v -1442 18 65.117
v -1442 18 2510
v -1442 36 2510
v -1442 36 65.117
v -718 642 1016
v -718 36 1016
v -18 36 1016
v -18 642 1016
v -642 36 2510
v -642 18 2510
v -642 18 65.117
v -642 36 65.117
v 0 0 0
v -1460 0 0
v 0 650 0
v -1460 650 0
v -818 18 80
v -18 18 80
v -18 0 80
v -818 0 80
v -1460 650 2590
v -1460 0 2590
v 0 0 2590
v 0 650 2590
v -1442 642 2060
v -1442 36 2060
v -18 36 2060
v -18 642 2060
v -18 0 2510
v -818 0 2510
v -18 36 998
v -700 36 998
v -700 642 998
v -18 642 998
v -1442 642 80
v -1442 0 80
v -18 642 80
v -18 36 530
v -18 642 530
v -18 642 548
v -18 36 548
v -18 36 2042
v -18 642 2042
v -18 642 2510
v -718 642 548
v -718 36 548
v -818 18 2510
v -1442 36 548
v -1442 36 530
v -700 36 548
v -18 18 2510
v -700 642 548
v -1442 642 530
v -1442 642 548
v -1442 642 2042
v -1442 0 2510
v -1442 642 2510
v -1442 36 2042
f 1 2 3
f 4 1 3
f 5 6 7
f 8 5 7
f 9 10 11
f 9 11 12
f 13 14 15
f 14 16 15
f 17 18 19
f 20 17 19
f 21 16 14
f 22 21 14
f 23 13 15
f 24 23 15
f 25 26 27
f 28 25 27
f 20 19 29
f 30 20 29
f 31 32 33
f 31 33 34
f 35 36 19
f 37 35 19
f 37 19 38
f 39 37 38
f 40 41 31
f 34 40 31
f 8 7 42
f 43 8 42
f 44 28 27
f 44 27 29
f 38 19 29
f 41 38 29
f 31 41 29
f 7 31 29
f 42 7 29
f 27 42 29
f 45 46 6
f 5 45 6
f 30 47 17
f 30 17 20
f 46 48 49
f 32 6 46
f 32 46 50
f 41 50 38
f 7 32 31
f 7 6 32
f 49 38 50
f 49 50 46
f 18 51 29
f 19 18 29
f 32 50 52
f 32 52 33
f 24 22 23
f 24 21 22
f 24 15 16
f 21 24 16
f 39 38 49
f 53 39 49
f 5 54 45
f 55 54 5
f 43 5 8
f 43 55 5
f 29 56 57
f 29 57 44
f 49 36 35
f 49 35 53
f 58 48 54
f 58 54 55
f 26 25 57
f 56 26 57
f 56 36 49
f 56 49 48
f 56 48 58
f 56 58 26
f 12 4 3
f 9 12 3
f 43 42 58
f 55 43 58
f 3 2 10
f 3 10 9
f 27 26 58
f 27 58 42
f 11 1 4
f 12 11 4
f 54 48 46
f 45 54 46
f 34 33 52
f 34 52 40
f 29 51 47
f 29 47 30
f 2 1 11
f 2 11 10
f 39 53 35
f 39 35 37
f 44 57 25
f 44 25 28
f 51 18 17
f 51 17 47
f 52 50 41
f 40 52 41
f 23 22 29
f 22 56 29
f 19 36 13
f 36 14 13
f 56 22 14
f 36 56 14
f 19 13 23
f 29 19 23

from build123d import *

# Parameters (mm, degrees)
F1_DEPTH = 2590
F2_W     = 1424
F2_H     = 2430
F3_DEPTH = 36
F4_W     = 1424
F4_H     = 450
F4_W_2   = 682
F5_DEPTH = 606
F6_W     = 18
F6_H     = 2430
F7_DEPTH = 800
F8_W     = 18
F8_H     = 2444.882574
F9_DEPTH = 800


with BuildPart() as f1:
    # F0 (on Top) → F1 (new body)
    with BuildSketch(Plane.XY):
        Polygon((-1460, 0), (0, 0), (0, 650), (-1460, 650), (-1460, 430), (-1460, 325), align=None)
    extrude(amount=F1_DEPTH)

    # F2 (on face) → F3 (cut)
    with BuildSketch(Plane.XZ):
        with Locations((-730, 1295)):
            Rectangle(F2_W, F2_H)
    extrude(amount=-F3_DEPTH, mode=Mode.SUBTRACT)

    # F4 (on face) → F5 (cut)
    with BuildSketch(Plane.XZ.offset(-36)):
        with Locations((-730, 2285)):
            Rectangle(F4_W, F4_H)
        with Locations((-359, 773)):
            Rectangle(F4_W_2, F4_H)
        Polygon((-18, 2042), (-1442, 2042), (-1442, 548), (-718, 548), (-718, 1016), (-18, 1016), align=None)
        Polygon((-18, 530), (-1442, 530), (-1442, 104.263887), (-1442, 80), (-18, 80), align=None)
    extrude(amount=-F5_DEPTH, mode=Mode.SUBTRACT)


with BuildPart() as f7:
    # F6 (on face) → F7 (new body)
    with BuildSketch(Plane(origin=(-18, 0, 0), x_dir=(0, -1, 0), z_dir=(-1, 0, 0))):
        with Locations((-9, 1295)):
            Rectangle(F6_W, F6_H)
    extrude(amount=F7_DEPTH)


with BuildPart() as f9:
    # F8 (on face) → F9 (new body)
    with BuildSketch(Plane.YZ.offset(-1442)):
        with Locations((27, 1287.558713)):
            Rectangle(F8_W, F8_H)
    extrude(amount=F9_DEPTH)


solid = Compound([f1.part, f7.part, f9.part])
